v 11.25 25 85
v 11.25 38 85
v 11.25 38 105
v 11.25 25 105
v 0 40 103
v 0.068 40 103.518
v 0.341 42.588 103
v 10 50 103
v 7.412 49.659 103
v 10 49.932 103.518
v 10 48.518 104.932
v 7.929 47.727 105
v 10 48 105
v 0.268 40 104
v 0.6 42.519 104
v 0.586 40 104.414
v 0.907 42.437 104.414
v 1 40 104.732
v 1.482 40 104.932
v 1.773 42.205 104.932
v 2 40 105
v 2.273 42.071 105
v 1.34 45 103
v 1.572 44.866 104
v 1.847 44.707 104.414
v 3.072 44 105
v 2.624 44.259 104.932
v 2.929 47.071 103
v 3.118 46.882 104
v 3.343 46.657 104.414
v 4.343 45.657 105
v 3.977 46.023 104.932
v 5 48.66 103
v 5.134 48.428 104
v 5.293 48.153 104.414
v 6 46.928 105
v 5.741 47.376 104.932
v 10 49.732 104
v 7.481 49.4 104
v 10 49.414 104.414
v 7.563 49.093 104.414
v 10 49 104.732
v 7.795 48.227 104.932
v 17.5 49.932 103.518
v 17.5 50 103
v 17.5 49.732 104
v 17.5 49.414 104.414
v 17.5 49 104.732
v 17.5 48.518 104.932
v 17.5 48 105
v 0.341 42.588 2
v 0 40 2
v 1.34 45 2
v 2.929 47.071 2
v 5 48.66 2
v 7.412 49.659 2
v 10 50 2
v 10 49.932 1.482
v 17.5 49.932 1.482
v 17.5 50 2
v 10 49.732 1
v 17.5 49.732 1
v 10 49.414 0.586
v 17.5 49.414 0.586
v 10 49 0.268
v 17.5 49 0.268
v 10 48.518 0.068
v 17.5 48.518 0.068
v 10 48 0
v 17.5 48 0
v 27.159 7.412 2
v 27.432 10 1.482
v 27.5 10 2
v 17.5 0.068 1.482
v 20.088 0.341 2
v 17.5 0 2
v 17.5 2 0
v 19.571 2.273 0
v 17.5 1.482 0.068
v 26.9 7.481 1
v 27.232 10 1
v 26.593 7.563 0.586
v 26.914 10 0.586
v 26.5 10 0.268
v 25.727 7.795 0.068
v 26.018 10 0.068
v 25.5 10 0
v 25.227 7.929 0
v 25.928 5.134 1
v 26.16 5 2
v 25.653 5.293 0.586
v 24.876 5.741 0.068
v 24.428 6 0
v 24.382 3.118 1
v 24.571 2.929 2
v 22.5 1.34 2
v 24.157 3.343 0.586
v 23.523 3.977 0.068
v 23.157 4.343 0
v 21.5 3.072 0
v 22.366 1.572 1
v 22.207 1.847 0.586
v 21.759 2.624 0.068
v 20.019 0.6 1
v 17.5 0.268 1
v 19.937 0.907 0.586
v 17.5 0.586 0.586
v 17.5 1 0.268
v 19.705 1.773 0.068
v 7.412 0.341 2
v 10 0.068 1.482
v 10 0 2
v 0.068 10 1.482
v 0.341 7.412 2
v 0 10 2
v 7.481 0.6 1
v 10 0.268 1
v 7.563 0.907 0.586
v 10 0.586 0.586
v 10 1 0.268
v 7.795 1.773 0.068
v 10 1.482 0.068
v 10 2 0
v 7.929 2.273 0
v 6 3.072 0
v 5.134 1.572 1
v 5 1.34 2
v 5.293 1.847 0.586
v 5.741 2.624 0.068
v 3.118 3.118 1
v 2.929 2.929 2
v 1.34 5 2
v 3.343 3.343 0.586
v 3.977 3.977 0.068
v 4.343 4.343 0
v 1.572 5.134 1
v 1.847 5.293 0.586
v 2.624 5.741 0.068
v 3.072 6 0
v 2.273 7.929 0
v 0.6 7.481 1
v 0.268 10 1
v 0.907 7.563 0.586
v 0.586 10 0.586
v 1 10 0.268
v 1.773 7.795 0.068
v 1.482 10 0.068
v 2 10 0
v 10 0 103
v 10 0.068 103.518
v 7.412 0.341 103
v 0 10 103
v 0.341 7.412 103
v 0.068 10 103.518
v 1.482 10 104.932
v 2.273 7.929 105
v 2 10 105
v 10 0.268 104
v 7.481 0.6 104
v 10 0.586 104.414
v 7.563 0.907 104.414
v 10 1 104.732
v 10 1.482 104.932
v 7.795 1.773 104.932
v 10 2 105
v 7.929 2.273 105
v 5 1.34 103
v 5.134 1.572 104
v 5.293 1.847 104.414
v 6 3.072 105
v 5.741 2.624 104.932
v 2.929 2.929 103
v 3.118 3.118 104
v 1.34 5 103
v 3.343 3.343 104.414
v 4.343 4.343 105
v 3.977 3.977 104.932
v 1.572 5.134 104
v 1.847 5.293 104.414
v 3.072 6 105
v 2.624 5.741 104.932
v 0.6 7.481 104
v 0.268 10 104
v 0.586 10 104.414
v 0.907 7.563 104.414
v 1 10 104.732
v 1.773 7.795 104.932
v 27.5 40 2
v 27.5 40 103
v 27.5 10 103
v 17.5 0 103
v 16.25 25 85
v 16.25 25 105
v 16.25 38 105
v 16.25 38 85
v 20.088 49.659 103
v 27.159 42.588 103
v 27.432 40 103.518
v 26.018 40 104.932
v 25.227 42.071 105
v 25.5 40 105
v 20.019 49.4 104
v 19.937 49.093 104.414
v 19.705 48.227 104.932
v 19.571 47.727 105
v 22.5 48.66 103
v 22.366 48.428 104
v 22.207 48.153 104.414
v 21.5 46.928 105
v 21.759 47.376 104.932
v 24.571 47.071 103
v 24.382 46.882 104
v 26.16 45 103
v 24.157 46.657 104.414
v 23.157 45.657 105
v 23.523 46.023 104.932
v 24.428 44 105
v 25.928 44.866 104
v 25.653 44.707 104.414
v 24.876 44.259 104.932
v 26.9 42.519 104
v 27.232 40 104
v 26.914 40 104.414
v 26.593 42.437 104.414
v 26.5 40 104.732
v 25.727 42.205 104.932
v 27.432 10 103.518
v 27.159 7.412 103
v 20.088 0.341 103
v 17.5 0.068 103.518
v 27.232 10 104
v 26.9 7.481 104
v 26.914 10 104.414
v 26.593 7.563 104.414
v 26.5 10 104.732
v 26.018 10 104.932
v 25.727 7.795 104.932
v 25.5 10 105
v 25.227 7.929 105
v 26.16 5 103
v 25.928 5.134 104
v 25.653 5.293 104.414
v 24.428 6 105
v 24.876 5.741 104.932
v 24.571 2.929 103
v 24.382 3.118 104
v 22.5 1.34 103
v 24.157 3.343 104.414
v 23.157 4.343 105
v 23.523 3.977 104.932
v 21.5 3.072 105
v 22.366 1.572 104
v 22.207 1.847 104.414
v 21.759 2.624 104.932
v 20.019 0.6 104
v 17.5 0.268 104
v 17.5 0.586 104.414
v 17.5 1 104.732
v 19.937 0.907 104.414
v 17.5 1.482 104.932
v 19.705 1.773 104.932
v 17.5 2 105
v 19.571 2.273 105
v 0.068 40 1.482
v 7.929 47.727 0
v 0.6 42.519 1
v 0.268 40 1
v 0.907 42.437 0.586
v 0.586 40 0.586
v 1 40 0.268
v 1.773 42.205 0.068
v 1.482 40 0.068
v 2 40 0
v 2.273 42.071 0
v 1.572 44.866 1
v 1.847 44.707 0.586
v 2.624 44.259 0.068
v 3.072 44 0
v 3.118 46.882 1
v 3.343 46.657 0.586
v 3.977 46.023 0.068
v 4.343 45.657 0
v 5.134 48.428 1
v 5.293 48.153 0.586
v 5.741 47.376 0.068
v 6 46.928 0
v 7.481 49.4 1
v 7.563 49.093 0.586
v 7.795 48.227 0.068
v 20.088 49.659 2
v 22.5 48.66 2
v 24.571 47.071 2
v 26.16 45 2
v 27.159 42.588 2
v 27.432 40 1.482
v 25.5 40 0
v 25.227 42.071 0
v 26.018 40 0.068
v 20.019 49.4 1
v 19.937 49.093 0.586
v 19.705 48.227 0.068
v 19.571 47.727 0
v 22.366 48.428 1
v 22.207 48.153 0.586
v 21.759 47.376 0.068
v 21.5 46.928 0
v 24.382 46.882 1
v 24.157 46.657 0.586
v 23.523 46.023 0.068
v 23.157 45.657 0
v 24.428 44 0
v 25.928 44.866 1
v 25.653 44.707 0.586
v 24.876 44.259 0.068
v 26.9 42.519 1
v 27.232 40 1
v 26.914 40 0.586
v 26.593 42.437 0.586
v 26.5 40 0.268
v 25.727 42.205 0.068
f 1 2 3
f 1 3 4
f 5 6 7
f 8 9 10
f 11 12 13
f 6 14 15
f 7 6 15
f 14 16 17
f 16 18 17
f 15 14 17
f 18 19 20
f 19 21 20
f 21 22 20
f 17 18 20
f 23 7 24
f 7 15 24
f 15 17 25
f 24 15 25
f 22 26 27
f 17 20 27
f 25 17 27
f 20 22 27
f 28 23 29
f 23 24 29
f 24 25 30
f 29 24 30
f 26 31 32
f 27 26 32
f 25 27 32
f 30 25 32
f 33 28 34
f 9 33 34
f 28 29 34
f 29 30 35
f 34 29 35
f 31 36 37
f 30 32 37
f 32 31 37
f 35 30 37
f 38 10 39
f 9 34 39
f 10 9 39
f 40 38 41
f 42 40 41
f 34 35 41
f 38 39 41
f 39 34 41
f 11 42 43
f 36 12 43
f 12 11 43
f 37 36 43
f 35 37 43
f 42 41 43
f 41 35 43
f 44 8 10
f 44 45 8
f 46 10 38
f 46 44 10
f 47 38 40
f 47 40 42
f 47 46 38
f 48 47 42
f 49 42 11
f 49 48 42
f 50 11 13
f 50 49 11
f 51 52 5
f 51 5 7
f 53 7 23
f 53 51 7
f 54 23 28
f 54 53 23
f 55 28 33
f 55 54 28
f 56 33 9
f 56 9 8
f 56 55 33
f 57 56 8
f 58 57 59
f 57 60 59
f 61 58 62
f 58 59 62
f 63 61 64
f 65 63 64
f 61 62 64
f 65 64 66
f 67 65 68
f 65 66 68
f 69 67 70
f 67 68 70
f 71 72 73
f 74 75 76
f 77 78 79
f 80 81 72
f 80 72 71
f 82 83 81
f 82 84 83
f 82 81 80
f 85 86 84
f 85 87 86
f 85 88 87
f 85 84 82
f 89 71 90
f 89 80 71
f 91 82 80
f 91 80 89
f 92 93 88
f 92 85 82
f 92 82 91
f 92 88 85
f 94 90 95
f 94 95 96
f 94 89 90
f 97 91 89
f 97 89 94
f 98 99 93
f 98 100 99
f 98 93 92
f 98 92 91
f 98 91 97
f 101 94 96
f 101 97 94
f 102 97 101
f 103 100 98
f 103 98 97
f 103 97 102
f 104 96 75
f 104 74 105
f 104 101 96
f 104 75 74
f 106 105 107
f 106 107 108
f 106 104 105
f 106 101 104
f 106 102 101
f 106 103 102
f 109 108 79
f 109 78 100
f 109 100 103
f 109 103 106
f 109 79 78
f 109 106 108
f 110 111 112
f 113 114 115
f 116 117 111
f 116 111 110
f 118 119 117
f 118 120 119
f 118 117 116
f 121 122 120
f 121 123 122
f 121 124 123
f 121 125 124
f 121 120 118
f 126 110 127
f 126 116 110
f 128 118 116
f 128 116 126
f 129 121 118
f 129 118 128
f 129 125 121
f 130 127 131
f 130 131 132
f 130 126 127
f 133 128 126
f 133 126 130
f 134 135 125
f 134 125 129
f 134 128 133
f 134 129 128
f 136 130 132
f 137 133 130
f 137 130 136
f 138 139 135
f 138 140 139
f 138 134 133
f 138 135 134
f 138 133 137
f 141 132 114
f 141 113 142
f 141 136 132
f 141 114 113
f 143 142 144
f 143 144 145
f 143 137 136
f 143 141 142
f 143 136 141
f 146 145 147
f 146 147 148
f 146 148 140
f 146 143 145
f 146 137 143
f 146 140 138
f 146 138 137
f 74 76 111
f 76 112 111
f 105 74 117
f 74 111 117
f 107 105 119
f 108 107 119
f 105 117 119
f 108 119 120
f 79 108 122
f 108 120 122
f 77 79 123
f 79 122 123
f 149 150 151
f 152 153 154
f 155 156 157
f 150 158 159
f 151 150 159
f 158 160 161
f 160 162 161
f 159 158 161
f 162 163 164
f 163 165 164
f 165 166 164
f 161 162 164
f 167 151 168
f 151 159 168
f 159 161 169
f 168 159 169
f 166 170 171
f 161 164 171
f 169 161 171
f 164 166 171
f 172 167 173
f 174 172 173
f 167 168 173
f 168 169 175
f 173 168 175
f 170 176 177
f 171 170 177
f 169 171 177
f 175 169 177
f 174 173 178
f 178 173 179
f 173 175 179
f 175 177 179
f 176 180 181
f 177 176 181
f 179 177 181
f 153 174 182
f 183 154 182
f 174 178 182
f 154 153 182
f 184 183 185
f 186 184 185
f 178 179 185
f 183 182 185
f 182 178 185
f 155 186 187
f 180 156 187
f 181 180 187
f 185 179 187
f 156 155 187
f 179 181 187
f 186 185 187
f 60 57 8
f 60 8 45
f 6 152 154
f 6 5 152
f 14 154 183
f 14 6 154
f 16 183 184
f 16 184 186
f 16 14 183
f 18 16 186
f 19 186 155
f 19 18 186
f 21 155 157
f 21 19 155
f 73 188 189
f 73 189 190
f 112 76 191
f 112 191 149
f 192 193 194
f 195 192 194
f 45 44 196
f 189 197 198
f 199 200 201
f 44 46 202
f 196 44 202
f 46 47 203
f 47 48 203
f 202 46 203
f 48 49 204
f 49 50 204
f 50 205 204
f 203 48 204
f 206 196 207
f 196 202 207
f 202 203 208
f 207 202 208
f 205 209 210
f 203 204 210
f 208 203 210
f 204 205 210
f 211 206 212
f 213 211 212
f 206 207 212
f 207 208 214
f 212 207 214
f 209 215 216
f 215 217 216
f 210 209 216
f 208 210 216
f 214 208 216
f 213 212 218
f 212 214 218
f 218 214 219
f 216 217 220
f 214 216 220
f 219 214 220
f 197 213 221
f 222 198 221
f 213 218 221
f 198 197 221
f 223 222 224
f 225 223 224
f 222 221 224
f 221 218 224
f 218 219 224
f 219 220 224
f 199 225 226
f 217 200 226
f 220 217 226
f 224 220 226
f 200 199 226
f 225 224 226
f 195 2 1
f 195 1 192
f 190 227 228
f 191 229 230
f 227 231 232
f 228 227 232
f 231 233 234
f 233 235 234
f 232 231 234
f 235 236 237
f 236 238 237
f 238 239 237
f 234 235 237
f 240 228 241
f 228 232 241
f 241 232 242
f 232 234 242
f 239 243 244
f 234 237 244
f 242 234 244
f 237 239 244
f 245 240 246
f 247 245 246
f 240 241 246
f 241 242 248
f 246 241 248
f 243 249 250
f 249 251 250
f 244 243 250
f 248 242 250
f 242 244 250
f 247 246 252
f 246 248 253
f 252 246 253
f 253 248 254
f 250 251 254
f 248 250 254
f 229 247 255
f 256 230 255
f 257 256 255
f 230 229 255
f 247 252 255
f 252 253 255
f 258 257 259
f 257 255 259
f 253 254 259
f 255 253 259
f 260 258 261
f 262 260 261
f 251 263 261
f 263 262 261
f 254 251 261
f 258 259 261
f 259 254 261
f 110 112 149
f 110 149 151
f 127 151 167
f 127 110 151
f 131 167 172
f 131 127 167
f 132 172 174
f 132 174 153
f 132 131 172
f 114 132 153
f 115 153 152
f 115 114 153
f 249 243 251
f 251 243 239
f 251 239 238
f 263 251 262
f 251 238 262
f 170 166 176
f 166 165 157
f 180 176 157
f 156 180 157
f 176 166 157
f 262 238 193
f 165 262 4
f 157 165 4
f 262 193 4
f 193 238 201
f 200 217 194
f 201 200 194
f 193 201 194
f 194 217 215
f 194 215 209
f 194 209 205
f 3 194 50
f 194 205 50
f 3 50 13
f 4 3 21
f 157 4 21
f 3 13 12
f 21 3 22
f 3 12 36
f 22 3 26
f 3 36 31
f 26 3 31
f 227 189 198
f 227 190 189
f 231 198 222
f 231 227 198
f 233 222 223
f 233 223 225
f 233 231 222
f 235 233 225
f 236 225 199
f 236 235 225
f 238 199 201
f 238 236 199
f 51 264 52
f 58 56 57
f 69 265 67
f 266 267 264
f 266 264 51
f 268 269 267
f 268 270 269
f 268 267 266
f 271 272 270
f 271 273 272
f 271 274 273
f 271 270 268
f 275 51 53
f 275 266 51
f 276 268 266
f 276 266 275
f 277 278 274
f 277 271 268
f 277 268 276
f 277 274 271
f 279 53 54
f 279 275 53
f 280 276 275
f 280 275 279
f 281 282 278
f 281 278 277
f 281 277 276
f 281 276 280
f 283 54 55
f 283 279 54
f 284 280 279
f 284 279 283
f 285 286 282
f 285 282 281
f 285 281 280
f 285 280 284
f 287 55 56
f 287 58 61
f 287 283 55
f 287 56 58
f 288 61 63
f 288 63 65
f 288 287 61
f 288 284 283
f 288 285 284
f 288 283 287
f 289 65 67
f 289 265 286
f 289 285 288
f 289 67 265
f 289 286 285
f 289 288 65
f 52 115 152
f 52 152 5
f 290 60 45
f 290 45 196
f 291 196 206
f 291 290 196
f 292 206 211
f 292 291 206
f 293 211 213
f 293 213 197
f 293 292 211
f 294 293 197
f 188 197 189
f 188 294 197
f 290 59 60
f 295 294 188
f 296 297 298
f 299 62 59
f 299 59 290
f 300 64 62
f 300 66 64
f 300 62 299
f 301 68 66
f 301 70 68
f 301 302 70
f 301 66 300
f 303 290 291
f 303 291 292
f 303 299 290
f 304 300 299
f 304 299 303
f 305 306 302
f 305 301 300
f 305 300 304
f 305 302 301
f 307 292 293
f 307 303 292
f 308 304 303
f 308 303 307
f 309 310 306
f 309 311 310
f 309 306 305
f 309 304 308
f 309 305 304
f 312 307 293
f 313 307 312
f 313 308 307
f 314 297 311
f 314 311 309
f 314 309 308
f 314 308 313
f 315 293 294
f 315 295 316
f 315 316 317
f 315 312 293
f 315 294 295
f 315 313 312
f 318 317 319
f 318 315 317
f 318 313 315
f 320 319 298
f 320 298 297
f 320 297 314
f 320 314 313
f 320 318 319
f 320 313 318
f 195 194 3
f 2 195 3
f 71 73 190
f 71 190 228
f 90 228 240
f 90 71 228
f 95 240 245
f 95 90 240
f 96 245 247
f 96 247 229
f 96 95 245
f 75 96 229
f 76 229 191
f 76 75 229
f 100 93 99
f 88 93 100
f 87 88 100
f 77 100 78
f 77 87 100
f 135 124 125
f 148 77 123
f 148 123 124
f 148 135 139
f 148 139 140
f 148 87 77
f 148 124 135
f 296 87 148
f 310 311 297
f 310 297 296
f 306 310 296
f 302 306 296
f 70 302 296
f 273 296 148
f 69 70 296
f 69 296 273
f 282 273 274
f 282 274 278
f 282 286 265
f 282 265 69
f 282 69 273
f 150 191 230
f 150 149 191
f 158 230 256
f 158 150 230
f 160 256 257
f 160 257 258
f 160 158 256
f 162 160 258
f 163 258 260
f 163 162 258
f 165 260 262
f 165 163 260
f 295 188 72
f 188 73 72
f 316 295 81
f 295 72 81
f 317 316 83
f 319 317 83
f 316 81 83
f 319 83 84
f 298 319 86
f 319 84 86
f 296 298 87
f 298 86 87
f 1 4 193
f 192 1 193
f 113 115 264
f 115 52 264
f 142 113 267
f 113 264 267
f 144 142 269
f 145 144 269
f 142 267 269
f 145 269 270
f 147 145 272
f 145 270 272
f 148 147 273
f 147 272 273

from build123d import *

# Parameters (mm, degrees)
BOSS_EXTRUDE1_DEPTH = 105
FILLET1_R           = 2
CUT_EXTRUDE1_DEPTH  = 20


with BuildPart() as part:
    # Sketch1 → Boss-Extrude1 (new body)
    with BuildSketch(Plane.XY):
        with BuildLine():
            Line((0, 10), (0, 40))
            ThreePointArc((0, 40), (2.928932188, 47.071067812), (10, 50))
            Line((10, 50), (17.5, 50))
            ThreePointArc((17.5, 50), (24.571067812, 47.071067812), (27.5, 40))
            Line((27.5, 40), (27.5, 10))
            ThreePointArc((27.5, 10), (24.571067812, 2.928932188), (17.5, 0))
            Line((17.5, 0), (10, 0))
            ThreePointArc((10, 0), (2.928932188, 2.928932188), (0, 10))
        make_face()
    extrude(amount=BOSS_EXTRUDE1_DEPTH)

    # Fillet1
    fillet1_edges = [part.edges().sort_by_distance(p)[0] for p in [
        (13.75, 50, 0),
        (24.571067812, 47.071067812, 0),
        (27.5, 25, 0),
        (24.571067812, 2.928932188, 0),
        (24.571067812, 47.071067812, 105),
        (13.75, 50, 105),
        (2.928932188, 47.071067812, 105),
        (0, 25, 105),
        (2.928932188, 2.928932188, 105),
        (13.75, 0, 105),
        (24.571067812, 2.928932188, 105),
        (13.75, 0, 0),
        (27.5, 25, 105),
        (2.928932188, 2.928932188, 0),
        (0, 25, 0),
        (2.928932188, 47.071067812, 0),
    ]]
    fillet(fillet1_edges, radius=FILLET1_R)

    # Sketch2 → Cut-Extrude1 (cut)
    with BuildSketch(Plane.XY.offset(105)):
        Polygon((13.75, 38), (11.25, 38), (11.25, 25), (16.25, 25), (16.25, 38), align=None)
    extrude(amount=-CUT_EXTRUDE1_DEPTH, mode=Mode.SUBTRACT)


solid = part.part
